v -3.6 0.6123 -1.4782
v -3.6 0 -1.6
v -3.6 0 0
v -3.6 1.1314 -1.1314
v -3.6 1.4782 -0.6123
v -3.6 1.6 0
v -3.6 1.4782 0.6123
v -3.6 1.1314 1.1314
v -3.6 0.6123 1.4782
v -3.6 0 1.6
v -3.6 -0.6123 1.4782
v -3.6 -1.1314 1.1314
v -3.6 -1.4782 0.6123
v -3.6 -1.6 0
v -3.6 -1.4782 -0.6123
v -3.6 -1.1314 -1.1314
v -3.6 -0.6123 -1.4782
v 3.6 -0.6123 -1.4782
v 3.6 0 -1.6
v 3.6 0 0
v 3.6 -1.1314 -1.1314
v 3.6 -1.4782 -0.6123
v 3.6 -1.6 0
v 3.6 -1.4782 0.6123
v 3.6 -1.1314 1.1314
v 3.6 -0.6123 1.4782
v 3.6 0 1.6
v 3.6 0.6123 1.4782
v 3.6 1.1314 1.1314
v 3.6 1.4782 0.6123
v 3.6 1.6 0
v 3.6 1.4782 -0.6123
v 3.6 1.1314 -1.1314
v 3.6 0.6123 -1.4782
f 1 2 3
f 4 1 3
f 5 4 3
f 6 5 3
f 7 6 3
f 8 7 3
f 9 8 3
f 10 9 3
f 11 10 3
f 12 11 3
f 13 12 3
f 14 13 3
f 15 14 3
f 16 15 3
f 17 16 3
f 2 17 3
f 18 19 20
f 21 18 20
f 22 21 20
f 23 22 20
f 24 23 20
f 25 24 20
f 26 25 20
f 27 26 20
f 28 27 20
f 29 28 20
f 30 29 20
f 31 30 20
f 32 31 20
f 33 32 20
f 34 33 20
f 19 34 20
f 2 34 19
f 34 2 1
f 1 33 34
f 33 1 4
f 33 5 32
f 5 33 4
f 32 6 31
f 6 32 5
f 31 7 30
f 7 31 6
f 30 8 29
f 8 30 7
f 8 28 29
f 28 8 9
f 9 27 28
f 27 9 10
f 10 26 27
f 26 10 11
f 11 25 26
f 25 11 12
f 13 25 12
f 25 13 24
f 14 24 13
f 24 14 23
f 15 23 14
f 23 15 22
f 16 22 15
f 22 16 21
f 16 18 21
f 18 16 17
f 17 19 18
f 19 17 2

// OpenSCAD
// file: ../p/4-4edge.scad
use <../lib.scad>
function ldraw_lib__4_4edge() = [
// 0 Circle 1.0
// 0 Name: 4-4edge.dat
// 0 Author: James Jessiman
// 0 !LDRAW_ORG Primitive UPDATE 2017-01
// 0 !LICENSE Licensed under CC BY 4.0 : see CAreadme.txt
// 
// 0 BFC CERTIFY CCW
  [0,"BFC","CERTIFY"],
  [0,"BFC","CCW"],
// 
// 0 !HISTORY 1998-12-15 [PTadmin] Official Update 1998-10
// 0 !HISTORY 2005-12-28 [PTadmin] Official Update 2005-01
// 0 !HISTORY 2007-06-24 [PTadmin] Header formatted for Contributor Agreement
// 0 !HISTORY 2008-07-01 [PTadmin] Official Update 2008-01
// 0 !HISTORY 2017-01-15 [Steffen] BFCed
// 0 !HISTORY 2017-12-30 [PTadmin] Official Update 2017-01
// 
// 
// 2 24 1 0 0 0.9239 0 0.3827
  [2,24,1,0,0,0.9239,0,0.3827],
// 2 24 0.9239 0 0.3827 0.7071 0 0.7071
  [2,24,0.9239,0,0.3827,0.7071,0,0.7071],
// 2 24 0.7071 0 0.7071 0.3827 0 0.9239
  [2,24,0.7071,0,0.7071,0.3827,0,0.9239],
// 2 24 0.3827 0 0.9239 0 0 1
  [2,24,0.3827,0,0.9239,0,0,1],
// 2 24 0 0 1 -0.3827 0 0.9239
  [2,24,0,0,1,-0.3827,0,0.9239],
// 2 24 -0.3827 0 0.9239 -0.7071 0 0.7071
  [2,24,-0.3827,0,0.9239,-0.7071,0,0.7071],
// 2 24 -0.7071 0 0.7071 -0.9239 0 0.3827
  [2,24,-0.7071,0,0.7071,-0.9239,0,0.3827],
// 2 24 -0.9239 0 0.3827 -1 0 -0
  [2,24,-0.9239,0,0.3827,-1,0,-0],
// 2 24 -1 0 -0 -0.9239 0 -0.3827
  [2,24,-1,0,-0,-0.9239,0,-0.3827],
// 2 24 -0.9239 0 -0.3827 -0.7071 0 -0.7071
  [2,24,-0.9239,0,-0.3827,-0.7071,0,-0.7071],
// 2 24 -0.7071 0 -0.7071 -0.3827 0 -0.9239
  [2,24,-0.7071,0,-0.7071,-0.3827,0,-0.9239],
// 2 24 -0.3827 0 -0.9239 0 0 -1
  [2,24,-0.3827,0,-0.9239,0,0,-1],
// 2 24 0 0 -1 0.3827 0 -0.9239
  [2,24,0,0,-1,0.3827,0,-0.9239],
// 2 24 0.3827 0 -0.9239 0.7071 0 -0.7071
  [2,24,0.3827,0,-0.9239,0.7071,0,-0.7071],
// 2 24 0.7071 0 -0.7071 0.9239 0 -0.3827
  [2,24,0.7071,0,-0.7071,0.9239,0,-0.3827],
// 2 24 0.9239 0 -0.3827 1 0 0
  [2,24,0.9239,0,-0.3827,1,0,0],
];
module ldraw_lib__4_4edge(step=0, col=false, unit=2/5, alt=false, line=0.2, solid=!$preview)
    makepoly(ldraw_lib__4_4edge(), step=step, col=col, unit=unit, alt=alt, line=line, solid=solid);
ldraw_lib__4_4edge(line=0.2);
// file: ../p/4-4disc.scad
use <../lib.scad>
function ldraw_lib__4_4disc() = [
// 0 Disc 1.0
// 0 Name: 4-4disc.dat
// 0 Author: James Jessiman
// 0 !LDRAW_ORG Primitive UPDATE 2002-02
// 0 !LICENSE Licensed under CC BY 4.0 : see CAreadme.txt
// 
// 0 BFC CERTIFY CCW
  [0,"BFC","CERTIFY"],
  [0,"BFC","CCW"],
// 
// 0 !HISTORY 1998-12-15 [PTadmin] Official Update 1998-10
// 0 !HISTORY 2002-03-23 [sbliss] Added BFC statement
// 0 !HISTORY 2002-04-25 [PTadmin] Official Update 2002-02
// 0 !HISTORY 2007-06-24 [PTadmin] Header formatted for Contributor Agreement
// 0 !HISTORY 2008-07-01 [PTadmin] Official Update 2008-01
// 
// 
// 3 16 0 0 0 1 0 0 0.9239 0 0.3827
  [3,16,0,0,0,1,0,0,0.9239,0,0.3827],
// 3 16 0 0 0 0.9239 0 0.3827 0.7071 0 0.7071
  [3,16,0,0,0,0.9239,0,0.3827,0.7071,0,0.7071],
// 3 16 0 0 0 0.7071 0 0.7071 0.3827 0 0.9239
  [3,16,0,0,0,0.7071,0,0.7071,0.3827,0,0.9239],
// 3 16 0 0 0 0.3827 0 0.9239 0 0 1
  [3,16,0,0,0,0.3827,0,0.9239,0,0,1],
// 3 16 0 0 0 0 0 1 -0.3827 0 0.9239
  [3,16,0,0,0,0,0,1,-0.3827,0,0.9239],
// 3 16 0 0 0 -0.3827 0 0.9239 -0.7071 0 0.7071
  [3,16,0,0,0,-0.3827,0,0.9239,-0.7071,0,0.7071],
// 3 16 0 0 0 -0.7071 0 0.7071 -0.9239 0 0.3827
  [3,16,0,0,0,-0.7071,0,0.7071,-0.9239,0,0.3827],
// 3 16 0 0 0 -0.9239 0 0.3827 -1 0 -0
  [3,16,0,0,0,-0.9239,0,0.3827,-1,0,-0],
// 3 16 0 0 0 -1 0 -0 -0.9239 0 -0.3827
  [3,16,0,0,0,-1,0,-0,-0.9239,0,-0.3827],
// 3 16 0 0 0 -0.9239 0 -0.3827 -0.7071 0 -0.7071
  [3,16,0,0,0,-0.9239,0,-0.3827,-0.7071,0,-0.7071],
// 3 16 0 0 0 -0.7071 0 -0.7071 -0.3827 0 -0.9239
  [3,16,0,0,0,-0.7071,0,-0.7071,-0.3827,0,-0.9239],
// 3 16 0 0 0 -0.3827 0 -0.9239 0 0 -1
  [3,16,0,0,0,-0.3827,0,-0.9239,0,0,-1],
// 3 16 0 0 0 0 0 -1 0.3827 0 -0.9239
  [3,16,0,0,0,0,0,-1,0.3827,0,-0.9239],
// 3 16 0 0 0 0.3827 0 -0.9239 0.7071 0 -0.7071
  [3,16,0,0,0,0.3827,0,-0.9239,0.7071,0,-0.7071],
// 3 16 0 0 0 0.7071 0 -0.7071 0.9239 0 -0.3827
  [3,16,0,0,0,0.7071,0,-0.7071,0.9239,0,-0.3827],
// 3 16 0 0 0 0.9239 0 -0.3827 1 0 0
  [3,16,0,0,0,0.9239,0,-0.3827,1,0,0],
// 0
];
module ldraw_lib__4_4disc(step=0, col=false, unit=2/5, alt=false, line=0.2, solid=!$preview)
    makepoly(ldraw_lib__4_4disc(), step=step, col=col, unit=unit, alt=alt, line=line, solid=solid);
ldraw_lib__4_4disc(line=0.2);
// file: ../p/4-4cyli.scad
use <../lib.scad>
function ldraw_lib__4_4cyli() = [
// 0 Cylinder 1.0
// 0 Name: 4-4cyli.dat
// 0 Author: James Jessiman
// 0 !LDRAW_ORG Primitive UPDATE 2005-01
// 0 !LICENSE Licensed under CC BY 2.0 and CC BY 4.0 : see CAreadme.txt
// 
// 0 BFC CERTIFY CCW
  [0,"BFC","CERTIFY"],
  [0,"BFC","CCW"],
// 
// 0 !HISTORY 1998-12-15 [PTadmin] Official Update 1998-10
// 0 !HISTORY 2002-03-23 [sbliss] Added BFC statement; merged headers from files in distributions LDraw 0.27 and Complete.
// 0 !HISTORY 2002-04-25 [PTadmin] Official Update 2002-02
// 0 !HISTORY 2004-12-14 [guyvivan] BFC CCW
// 0 !HISTORY 2005-12-28 [PTadmin] Official Update 2005-01
// 0 !HISTORY 2007-06-24 [PTadmin] Header formatted for Contributor Agreement
// 0 !HISTORY 2008-07-01 [PTadmin] Official Update 2008-01
// 
// 
// 4 16 1 1 0 0.9239 1 0.3827 0.9239 0 0.3827 1 0 0
  [4,16,1,1,0,0.9239,1,0.3827,0.9239,0,0.3827,1,0,0],
// 5 24 1 0 0 1 1 0 0.9239 0 0.3827 0.9239 0 -0.3827
  [5,24,1,0,0,1,1,0,0.9239,0,0.3827,0.9239,0,-0.3827],
// 4 16 0.9239 1 0.3827 0.7071 1 0.7071 0.7071 0 0.7071 0.9239 0 0.3827
  [4,16,0.9239,1,0.3827,0.7071,1,0.7071,0.7071,0,0.7071,0.9239,0,0.3827],
// 5 24 0.9239 0 0.3827 0.9239 1 0.3827 0.7071 0 0.7071 1 0 0
  [5,24,0.9239,0,0.3827,0.9239,1,0.3827,0.7071,0,0.7071,1,0,0],
// 4 16 0.7071 1 0.7071 0.3827 1 0.9239 0.3827 0 0.9239 0.7071 0 0.7071
  [4,16,0.7071,1,0.7071,0.3827,1,0.9239,0.3827,0,0.9239,0.7071,0,0.7071],
// 5 24 0.7071 0 0.7071 0.7071 1 0.7071 0.3827 0 0.9239 0.9239 0 0.3827
  [5,24,0.7071,0,0.7071,0.7071,1,0.7071,0.3827,0,0.9239,0.9239,0,0.3827],
// 4 16 0.3827 1 0.9239 0 1 1 0 0 1 0.3827 0 0.9239
  [4,16,0.3827,1,0.9239,0,1,1,0,0,1,0.3827,0,0.9239],
// 5 24 0.3827 0 0.9239 0.3827 1 0.9239 0 0 1 0.7071 0 0.7071
  [5,24,0.3827,0,0.9239,0.3827,1,0.9239,0,0,1,0.7071,0,0.7071],
// 4 16 0 1 1 -0.3827 1 0.9239 -0.3827 0 0.9239 0 0 1
  [4,16,0,1,1,-0.3827,1,0.9239,-0.3827,0,0.9239,0,0,1],
// 5 24 0 0 1 0 1 1 -0.3827 0 0.9239 0.3827 0 0.9239
  [5,24,0,0,1,0,1,1,-0.3827,0,0.9239,0.3827,0,0.9239],
// 4 16 -0.3827 1 0.9239 -0.7071 1 0.7071 -0.7071 0 0.7071 -0.3827 0 0.9239
  [4,16,-0.3827,1,0.9239,-0.7071,1,0.7071,-0.7071,0,0.7071,-0.3827,0,0.9239],
// 5 24 -0.3827 0 0.9239 -0.3827 1 0.9239 -0.7071 0 0.7071 0 0 1
  [5,24,-0.3827,0,0.9239,-0.3827,1,0.9239,-0.7071,0,0.7071,0,0,1],
// 4 16 -0.7071 1 0.7071 -0.9239 1 0.3827 -0.9239 0 0.3827 -0.7071 0 0.7071
  [4,16,-0.7071,1,0.7071,-0.9239,1,0.3827,-0.9239,0,0.3827,-0.7071,0,0.7071],
// 5 24 -0.7071 0 0.7071 -0.7071 1 0.7071 -0.9239 0 0.3827 -0.3827 0 0.9239
  [5,24,-0.7071,0,0.7071,-0.7071,1,0.7071,-0.9239,0,0.3827,-0.3827,0,0.9239],
// 4 16 -0.9239 1 0.3827 -1 1 0 -1 0 0 -0.9239 0 0.3827
  [4,16,-0.9239,1,0.3827,-1,1,0,-1,0,0,-0.9239,0,0.3827],
// 5 24 -0.9239 0 0.3827 -0.9239 1 0.3827 -1 0 0 -0.7071 0 0.7071
  [5,24,-0.9239,0,0.3827,-0.9239,1,0.3827,-1,0,0,-0.7071,0,0.7071],
// 4 16 -1 1 0 -0.9239 1 -0.3827 -0.9239 0 -0.3827 -1 0 0
  [4,16,-1,1,0,-0.9239,1,-0.3827,-0.9239,0,-0.3827,-1,0,0],
// 5 24 -1 0 0 -1 1 0 -0.9239 0 -0.3827 -0.9239 0 0.3827
  [5,24,-1,0,0,-1,1,0,-0.9239,0,-0.3827,-0.9239,0,0.3827],
// 4 16 -0.9239 1 -0.3827 -0.7071 1 -0.7071 -0.7071 0 -0.7071 -0.9239 0 -0.3827
  [4,16,-0.9239,1,-0.3827,-0.7071,1,-0.7071,-0.7071,0,-0.7071,-0.9239,0,-0.3827],
// 5 24 -0.9239 0 -0.3827 -0.9239 1 -0.3827 -0.7071 0 -0.7071 -1 0 0
  [5,24,-0.9239,0,-0.3827,-0.9239,1,-0.3827,-0.7071,0,-0.7071,-1,0,0],
// 4 16 -0.7071 1 -0.7071 -0.3827 1 -0.9239 -0.3827 0 -0.9239 -0.7071 0 -0.7071
  [4,16,-0.7071,1,-0.7071,-0.3827,1,-0.9239,-0.3827,0,-0.9239,-0.7071,0,-0.7071],
// 5 24 -0.7071 0 -0.7071 -0.7071 1 -0.7071 -0.3827 0 -0.9239 -0.9239 0 -0.3827
  [5,24,-0.7071,0,-0.7071,-0.7071,1,-0.7071,-0.3827,0,-0.9239,-0.9239,0,-0.3827],
// 4 16 -0.3827 1 -0.9239 0 1 -1 0 0 -1 -0.3827 0 -0.9239
  [4,16,-0.3827,1,-0.9239,0,1,-1,0,0,-1,-0.3827,0,-0.9239],
// 5 24 -0.3827 0 -0.9239 -0.3827 1 -0.9239 0 0 -1 -0.7071 0 -0.7071
  [5,24,-0.3827,0,-0.9239,-0.3827,1,-0.9239,0,0,-1,-0.7071,0,-0.7071],
// 4 16 0 1 -1 0.3827 1 -0.9239 0.3827 0 -0.9239 0 0 -1
  [4,16,0,1,-1,0.3827,1,-0.9239,0.3827,0,-0.9239,0,0,-1],
// 5 24 0 0 -1 0 1 -1 0.3827 0 -0.9239 -0.3827 0 -0.9239
  [5,24,0,0,-1,0,1,-1,0.3827,0,-0.9239,-0.3827,0,-0.9239],
// 4 16 0.3827 1 -0.9239 0.7071 1 -0.7071 0.7071 0 -0.7071 0.3827 0 -0.9239
  [4,16,0.3827,1,-0.9239,0.7071,1,-0.7071,0.7071,0,-0.7071,0.3827,0,-0.9239],
// 5 24 0.3827 0 -0.9239 0.3827 1 -0.9239 0.7071 0 -0.7071 0 0 -1
  [5,24,0.3827,0,-0.9239,0.3827,1,-0.9239,0.7071,0,-0.7071,0,0,-1],
// 4 16 0.7071 1 -0.7071 0.9239 1 -0.3827 0.9239 0 -0.3827 0.7071 0 -0.7071
  [4,16,0.7071,1,-0.7071,0.9239,1,-0.3827,0.9239,0,-0.3827,0.7071,0,-0.7071],
// 5 24 0.7071 0 -0.7071 0.7071 1 -0.7071 0.9239 0 -0.3827 0.3827 0 -0.9239
  [5,24,0.7071,0,-0.7071,0.7071,1,-0.7071,0.9239,0,-0.3827,0.3827,0,-0.9239],
// 4 16 0.9239 1 -0.3827 1 1 0 1 0 0 0.9239 0 -0.3827
  [4,16,0.9239,1,-0.3827,1,1,0,1,0,0,0.9239,0,-0.3827],
// 5 24 0.9239 0 -0.3827 0.9239 1 -0.3827 1 0 0 0.7071 0 -0.7071
  [5,24,0.9239,0,-0.3827,0.9239,1,-0.3827,1,0,0,0.7071,0,-0.7071],
// 0
];
module ldraw_lib__4_4cyli(step=0, col=false, unit=2/5, alt=false, line=0.2, solid=!$preview)
    makepoly(ldraw_lib__4_4cyli(), step=step, col=col, unit=unit, alt=alt, line=line, solid=solid);
ldraw_lib__4_4cyli(line=0.2);
// main file
use <../lib.scad>
use <../p/4-4cyli.scad>
use <../p/4-4disc.scad>
use <../p/4-4edge.scad>
function ldraw_lib__572c() = [
// 0 ~String Minifig Grip
// 0 Name: 572c.dat
// 0 Author: Steve Bliss [sbliss]
// 0 !LDRAW_ORG Shortcut UPDATE 2022-02
// 0 !LICENSE Licensed under CC BY 4.0 : see CAreadme.txt
// 
// 0 BFC CERTIFY CCW
  [0,"BFC","CERTIFY"],
  [0,"BFC","CCW"],
// 
// 0 !CATEGORY Minifig Accessory
// 
// 0 !HISTORY 2005-12-28 [PTadmin] Official Update 2005-01
// 0 !HISTORY 2007-07-09 [PTadmin] Header formatted for Contributor Agreement
// 0 !HISTORY 2008-07-01 [PTadmin] Official Update 2008-01
// 0 !HISTORY 2022-02-23 [OrionP] Added category
// 0 !HISTORY 2022-03-06 [PTadmin] Official Update 2022-02
// 
// 
// 1 16 -9 0 0 0 1 0 4 0 0 0 0 4 4-4edge.dat
  [1,16,-9,0,0,0,1,0,4,0,0,0,0,4, ldraw_lib__4_4edge()],
// 1 16 -9 0 0 0 1 0 1.5 0 0 0 0 1.5 4-4edge.dat
  [1,16,-9,0,0,0,1,0,1.5,0,0,0,0,1.5, ldraw_lib__4_4edge()],
// 1 16 9 0 0 0 1 0 1.5 0 0 0 0 1.5 4-4edge.dat
  [1,16,9,0,0,0,1,0,1.5,0,0,0,0,1.5, ldraw_lib__4_4edge()],
// 1 16 9 0 0 0 1 0 4 0 0 0 0 4 4-4edge.dat
  [1,16,9,0,0,0,1,0,4,0,0,0,0,4, ldraw_lib__4_4edge()],
// 1 16 -9 0 0 0 1 0 4 0 0 0 0 4 4-4disc.dat
  [1,16,-9,0,0,0,1,0,4,0,0,0,0,4, ldraw_lib__4_4disc()],
// 1 16 9 0 0 0 -1 0 4 0 0 0 0 -4 4-4disc.dat
  [1,16,9,0,0,0,-1,0,4,0,0,0,0,-4, ldraw_lib__4_4disc()],
// 1 16 -9 0 0 0 18 0 4 0 0 0 0 4 4-4cyli.dat
  [1,16,-9,0,0,0,18,0,4,0,0,0,0,4, ldraw_lib__4_4cyli()],
// 0
];
module ldraw_lib__572c(step=0, col=false, unit=2/5, alt=false, line=0.2, solid=!$preview)
    makepoly(ldraw_lib__572c(), step=step, col=col, unit=unit, alt=alt, line=line, solid=solid);
ldraw_lib__572c(line=0.2);
